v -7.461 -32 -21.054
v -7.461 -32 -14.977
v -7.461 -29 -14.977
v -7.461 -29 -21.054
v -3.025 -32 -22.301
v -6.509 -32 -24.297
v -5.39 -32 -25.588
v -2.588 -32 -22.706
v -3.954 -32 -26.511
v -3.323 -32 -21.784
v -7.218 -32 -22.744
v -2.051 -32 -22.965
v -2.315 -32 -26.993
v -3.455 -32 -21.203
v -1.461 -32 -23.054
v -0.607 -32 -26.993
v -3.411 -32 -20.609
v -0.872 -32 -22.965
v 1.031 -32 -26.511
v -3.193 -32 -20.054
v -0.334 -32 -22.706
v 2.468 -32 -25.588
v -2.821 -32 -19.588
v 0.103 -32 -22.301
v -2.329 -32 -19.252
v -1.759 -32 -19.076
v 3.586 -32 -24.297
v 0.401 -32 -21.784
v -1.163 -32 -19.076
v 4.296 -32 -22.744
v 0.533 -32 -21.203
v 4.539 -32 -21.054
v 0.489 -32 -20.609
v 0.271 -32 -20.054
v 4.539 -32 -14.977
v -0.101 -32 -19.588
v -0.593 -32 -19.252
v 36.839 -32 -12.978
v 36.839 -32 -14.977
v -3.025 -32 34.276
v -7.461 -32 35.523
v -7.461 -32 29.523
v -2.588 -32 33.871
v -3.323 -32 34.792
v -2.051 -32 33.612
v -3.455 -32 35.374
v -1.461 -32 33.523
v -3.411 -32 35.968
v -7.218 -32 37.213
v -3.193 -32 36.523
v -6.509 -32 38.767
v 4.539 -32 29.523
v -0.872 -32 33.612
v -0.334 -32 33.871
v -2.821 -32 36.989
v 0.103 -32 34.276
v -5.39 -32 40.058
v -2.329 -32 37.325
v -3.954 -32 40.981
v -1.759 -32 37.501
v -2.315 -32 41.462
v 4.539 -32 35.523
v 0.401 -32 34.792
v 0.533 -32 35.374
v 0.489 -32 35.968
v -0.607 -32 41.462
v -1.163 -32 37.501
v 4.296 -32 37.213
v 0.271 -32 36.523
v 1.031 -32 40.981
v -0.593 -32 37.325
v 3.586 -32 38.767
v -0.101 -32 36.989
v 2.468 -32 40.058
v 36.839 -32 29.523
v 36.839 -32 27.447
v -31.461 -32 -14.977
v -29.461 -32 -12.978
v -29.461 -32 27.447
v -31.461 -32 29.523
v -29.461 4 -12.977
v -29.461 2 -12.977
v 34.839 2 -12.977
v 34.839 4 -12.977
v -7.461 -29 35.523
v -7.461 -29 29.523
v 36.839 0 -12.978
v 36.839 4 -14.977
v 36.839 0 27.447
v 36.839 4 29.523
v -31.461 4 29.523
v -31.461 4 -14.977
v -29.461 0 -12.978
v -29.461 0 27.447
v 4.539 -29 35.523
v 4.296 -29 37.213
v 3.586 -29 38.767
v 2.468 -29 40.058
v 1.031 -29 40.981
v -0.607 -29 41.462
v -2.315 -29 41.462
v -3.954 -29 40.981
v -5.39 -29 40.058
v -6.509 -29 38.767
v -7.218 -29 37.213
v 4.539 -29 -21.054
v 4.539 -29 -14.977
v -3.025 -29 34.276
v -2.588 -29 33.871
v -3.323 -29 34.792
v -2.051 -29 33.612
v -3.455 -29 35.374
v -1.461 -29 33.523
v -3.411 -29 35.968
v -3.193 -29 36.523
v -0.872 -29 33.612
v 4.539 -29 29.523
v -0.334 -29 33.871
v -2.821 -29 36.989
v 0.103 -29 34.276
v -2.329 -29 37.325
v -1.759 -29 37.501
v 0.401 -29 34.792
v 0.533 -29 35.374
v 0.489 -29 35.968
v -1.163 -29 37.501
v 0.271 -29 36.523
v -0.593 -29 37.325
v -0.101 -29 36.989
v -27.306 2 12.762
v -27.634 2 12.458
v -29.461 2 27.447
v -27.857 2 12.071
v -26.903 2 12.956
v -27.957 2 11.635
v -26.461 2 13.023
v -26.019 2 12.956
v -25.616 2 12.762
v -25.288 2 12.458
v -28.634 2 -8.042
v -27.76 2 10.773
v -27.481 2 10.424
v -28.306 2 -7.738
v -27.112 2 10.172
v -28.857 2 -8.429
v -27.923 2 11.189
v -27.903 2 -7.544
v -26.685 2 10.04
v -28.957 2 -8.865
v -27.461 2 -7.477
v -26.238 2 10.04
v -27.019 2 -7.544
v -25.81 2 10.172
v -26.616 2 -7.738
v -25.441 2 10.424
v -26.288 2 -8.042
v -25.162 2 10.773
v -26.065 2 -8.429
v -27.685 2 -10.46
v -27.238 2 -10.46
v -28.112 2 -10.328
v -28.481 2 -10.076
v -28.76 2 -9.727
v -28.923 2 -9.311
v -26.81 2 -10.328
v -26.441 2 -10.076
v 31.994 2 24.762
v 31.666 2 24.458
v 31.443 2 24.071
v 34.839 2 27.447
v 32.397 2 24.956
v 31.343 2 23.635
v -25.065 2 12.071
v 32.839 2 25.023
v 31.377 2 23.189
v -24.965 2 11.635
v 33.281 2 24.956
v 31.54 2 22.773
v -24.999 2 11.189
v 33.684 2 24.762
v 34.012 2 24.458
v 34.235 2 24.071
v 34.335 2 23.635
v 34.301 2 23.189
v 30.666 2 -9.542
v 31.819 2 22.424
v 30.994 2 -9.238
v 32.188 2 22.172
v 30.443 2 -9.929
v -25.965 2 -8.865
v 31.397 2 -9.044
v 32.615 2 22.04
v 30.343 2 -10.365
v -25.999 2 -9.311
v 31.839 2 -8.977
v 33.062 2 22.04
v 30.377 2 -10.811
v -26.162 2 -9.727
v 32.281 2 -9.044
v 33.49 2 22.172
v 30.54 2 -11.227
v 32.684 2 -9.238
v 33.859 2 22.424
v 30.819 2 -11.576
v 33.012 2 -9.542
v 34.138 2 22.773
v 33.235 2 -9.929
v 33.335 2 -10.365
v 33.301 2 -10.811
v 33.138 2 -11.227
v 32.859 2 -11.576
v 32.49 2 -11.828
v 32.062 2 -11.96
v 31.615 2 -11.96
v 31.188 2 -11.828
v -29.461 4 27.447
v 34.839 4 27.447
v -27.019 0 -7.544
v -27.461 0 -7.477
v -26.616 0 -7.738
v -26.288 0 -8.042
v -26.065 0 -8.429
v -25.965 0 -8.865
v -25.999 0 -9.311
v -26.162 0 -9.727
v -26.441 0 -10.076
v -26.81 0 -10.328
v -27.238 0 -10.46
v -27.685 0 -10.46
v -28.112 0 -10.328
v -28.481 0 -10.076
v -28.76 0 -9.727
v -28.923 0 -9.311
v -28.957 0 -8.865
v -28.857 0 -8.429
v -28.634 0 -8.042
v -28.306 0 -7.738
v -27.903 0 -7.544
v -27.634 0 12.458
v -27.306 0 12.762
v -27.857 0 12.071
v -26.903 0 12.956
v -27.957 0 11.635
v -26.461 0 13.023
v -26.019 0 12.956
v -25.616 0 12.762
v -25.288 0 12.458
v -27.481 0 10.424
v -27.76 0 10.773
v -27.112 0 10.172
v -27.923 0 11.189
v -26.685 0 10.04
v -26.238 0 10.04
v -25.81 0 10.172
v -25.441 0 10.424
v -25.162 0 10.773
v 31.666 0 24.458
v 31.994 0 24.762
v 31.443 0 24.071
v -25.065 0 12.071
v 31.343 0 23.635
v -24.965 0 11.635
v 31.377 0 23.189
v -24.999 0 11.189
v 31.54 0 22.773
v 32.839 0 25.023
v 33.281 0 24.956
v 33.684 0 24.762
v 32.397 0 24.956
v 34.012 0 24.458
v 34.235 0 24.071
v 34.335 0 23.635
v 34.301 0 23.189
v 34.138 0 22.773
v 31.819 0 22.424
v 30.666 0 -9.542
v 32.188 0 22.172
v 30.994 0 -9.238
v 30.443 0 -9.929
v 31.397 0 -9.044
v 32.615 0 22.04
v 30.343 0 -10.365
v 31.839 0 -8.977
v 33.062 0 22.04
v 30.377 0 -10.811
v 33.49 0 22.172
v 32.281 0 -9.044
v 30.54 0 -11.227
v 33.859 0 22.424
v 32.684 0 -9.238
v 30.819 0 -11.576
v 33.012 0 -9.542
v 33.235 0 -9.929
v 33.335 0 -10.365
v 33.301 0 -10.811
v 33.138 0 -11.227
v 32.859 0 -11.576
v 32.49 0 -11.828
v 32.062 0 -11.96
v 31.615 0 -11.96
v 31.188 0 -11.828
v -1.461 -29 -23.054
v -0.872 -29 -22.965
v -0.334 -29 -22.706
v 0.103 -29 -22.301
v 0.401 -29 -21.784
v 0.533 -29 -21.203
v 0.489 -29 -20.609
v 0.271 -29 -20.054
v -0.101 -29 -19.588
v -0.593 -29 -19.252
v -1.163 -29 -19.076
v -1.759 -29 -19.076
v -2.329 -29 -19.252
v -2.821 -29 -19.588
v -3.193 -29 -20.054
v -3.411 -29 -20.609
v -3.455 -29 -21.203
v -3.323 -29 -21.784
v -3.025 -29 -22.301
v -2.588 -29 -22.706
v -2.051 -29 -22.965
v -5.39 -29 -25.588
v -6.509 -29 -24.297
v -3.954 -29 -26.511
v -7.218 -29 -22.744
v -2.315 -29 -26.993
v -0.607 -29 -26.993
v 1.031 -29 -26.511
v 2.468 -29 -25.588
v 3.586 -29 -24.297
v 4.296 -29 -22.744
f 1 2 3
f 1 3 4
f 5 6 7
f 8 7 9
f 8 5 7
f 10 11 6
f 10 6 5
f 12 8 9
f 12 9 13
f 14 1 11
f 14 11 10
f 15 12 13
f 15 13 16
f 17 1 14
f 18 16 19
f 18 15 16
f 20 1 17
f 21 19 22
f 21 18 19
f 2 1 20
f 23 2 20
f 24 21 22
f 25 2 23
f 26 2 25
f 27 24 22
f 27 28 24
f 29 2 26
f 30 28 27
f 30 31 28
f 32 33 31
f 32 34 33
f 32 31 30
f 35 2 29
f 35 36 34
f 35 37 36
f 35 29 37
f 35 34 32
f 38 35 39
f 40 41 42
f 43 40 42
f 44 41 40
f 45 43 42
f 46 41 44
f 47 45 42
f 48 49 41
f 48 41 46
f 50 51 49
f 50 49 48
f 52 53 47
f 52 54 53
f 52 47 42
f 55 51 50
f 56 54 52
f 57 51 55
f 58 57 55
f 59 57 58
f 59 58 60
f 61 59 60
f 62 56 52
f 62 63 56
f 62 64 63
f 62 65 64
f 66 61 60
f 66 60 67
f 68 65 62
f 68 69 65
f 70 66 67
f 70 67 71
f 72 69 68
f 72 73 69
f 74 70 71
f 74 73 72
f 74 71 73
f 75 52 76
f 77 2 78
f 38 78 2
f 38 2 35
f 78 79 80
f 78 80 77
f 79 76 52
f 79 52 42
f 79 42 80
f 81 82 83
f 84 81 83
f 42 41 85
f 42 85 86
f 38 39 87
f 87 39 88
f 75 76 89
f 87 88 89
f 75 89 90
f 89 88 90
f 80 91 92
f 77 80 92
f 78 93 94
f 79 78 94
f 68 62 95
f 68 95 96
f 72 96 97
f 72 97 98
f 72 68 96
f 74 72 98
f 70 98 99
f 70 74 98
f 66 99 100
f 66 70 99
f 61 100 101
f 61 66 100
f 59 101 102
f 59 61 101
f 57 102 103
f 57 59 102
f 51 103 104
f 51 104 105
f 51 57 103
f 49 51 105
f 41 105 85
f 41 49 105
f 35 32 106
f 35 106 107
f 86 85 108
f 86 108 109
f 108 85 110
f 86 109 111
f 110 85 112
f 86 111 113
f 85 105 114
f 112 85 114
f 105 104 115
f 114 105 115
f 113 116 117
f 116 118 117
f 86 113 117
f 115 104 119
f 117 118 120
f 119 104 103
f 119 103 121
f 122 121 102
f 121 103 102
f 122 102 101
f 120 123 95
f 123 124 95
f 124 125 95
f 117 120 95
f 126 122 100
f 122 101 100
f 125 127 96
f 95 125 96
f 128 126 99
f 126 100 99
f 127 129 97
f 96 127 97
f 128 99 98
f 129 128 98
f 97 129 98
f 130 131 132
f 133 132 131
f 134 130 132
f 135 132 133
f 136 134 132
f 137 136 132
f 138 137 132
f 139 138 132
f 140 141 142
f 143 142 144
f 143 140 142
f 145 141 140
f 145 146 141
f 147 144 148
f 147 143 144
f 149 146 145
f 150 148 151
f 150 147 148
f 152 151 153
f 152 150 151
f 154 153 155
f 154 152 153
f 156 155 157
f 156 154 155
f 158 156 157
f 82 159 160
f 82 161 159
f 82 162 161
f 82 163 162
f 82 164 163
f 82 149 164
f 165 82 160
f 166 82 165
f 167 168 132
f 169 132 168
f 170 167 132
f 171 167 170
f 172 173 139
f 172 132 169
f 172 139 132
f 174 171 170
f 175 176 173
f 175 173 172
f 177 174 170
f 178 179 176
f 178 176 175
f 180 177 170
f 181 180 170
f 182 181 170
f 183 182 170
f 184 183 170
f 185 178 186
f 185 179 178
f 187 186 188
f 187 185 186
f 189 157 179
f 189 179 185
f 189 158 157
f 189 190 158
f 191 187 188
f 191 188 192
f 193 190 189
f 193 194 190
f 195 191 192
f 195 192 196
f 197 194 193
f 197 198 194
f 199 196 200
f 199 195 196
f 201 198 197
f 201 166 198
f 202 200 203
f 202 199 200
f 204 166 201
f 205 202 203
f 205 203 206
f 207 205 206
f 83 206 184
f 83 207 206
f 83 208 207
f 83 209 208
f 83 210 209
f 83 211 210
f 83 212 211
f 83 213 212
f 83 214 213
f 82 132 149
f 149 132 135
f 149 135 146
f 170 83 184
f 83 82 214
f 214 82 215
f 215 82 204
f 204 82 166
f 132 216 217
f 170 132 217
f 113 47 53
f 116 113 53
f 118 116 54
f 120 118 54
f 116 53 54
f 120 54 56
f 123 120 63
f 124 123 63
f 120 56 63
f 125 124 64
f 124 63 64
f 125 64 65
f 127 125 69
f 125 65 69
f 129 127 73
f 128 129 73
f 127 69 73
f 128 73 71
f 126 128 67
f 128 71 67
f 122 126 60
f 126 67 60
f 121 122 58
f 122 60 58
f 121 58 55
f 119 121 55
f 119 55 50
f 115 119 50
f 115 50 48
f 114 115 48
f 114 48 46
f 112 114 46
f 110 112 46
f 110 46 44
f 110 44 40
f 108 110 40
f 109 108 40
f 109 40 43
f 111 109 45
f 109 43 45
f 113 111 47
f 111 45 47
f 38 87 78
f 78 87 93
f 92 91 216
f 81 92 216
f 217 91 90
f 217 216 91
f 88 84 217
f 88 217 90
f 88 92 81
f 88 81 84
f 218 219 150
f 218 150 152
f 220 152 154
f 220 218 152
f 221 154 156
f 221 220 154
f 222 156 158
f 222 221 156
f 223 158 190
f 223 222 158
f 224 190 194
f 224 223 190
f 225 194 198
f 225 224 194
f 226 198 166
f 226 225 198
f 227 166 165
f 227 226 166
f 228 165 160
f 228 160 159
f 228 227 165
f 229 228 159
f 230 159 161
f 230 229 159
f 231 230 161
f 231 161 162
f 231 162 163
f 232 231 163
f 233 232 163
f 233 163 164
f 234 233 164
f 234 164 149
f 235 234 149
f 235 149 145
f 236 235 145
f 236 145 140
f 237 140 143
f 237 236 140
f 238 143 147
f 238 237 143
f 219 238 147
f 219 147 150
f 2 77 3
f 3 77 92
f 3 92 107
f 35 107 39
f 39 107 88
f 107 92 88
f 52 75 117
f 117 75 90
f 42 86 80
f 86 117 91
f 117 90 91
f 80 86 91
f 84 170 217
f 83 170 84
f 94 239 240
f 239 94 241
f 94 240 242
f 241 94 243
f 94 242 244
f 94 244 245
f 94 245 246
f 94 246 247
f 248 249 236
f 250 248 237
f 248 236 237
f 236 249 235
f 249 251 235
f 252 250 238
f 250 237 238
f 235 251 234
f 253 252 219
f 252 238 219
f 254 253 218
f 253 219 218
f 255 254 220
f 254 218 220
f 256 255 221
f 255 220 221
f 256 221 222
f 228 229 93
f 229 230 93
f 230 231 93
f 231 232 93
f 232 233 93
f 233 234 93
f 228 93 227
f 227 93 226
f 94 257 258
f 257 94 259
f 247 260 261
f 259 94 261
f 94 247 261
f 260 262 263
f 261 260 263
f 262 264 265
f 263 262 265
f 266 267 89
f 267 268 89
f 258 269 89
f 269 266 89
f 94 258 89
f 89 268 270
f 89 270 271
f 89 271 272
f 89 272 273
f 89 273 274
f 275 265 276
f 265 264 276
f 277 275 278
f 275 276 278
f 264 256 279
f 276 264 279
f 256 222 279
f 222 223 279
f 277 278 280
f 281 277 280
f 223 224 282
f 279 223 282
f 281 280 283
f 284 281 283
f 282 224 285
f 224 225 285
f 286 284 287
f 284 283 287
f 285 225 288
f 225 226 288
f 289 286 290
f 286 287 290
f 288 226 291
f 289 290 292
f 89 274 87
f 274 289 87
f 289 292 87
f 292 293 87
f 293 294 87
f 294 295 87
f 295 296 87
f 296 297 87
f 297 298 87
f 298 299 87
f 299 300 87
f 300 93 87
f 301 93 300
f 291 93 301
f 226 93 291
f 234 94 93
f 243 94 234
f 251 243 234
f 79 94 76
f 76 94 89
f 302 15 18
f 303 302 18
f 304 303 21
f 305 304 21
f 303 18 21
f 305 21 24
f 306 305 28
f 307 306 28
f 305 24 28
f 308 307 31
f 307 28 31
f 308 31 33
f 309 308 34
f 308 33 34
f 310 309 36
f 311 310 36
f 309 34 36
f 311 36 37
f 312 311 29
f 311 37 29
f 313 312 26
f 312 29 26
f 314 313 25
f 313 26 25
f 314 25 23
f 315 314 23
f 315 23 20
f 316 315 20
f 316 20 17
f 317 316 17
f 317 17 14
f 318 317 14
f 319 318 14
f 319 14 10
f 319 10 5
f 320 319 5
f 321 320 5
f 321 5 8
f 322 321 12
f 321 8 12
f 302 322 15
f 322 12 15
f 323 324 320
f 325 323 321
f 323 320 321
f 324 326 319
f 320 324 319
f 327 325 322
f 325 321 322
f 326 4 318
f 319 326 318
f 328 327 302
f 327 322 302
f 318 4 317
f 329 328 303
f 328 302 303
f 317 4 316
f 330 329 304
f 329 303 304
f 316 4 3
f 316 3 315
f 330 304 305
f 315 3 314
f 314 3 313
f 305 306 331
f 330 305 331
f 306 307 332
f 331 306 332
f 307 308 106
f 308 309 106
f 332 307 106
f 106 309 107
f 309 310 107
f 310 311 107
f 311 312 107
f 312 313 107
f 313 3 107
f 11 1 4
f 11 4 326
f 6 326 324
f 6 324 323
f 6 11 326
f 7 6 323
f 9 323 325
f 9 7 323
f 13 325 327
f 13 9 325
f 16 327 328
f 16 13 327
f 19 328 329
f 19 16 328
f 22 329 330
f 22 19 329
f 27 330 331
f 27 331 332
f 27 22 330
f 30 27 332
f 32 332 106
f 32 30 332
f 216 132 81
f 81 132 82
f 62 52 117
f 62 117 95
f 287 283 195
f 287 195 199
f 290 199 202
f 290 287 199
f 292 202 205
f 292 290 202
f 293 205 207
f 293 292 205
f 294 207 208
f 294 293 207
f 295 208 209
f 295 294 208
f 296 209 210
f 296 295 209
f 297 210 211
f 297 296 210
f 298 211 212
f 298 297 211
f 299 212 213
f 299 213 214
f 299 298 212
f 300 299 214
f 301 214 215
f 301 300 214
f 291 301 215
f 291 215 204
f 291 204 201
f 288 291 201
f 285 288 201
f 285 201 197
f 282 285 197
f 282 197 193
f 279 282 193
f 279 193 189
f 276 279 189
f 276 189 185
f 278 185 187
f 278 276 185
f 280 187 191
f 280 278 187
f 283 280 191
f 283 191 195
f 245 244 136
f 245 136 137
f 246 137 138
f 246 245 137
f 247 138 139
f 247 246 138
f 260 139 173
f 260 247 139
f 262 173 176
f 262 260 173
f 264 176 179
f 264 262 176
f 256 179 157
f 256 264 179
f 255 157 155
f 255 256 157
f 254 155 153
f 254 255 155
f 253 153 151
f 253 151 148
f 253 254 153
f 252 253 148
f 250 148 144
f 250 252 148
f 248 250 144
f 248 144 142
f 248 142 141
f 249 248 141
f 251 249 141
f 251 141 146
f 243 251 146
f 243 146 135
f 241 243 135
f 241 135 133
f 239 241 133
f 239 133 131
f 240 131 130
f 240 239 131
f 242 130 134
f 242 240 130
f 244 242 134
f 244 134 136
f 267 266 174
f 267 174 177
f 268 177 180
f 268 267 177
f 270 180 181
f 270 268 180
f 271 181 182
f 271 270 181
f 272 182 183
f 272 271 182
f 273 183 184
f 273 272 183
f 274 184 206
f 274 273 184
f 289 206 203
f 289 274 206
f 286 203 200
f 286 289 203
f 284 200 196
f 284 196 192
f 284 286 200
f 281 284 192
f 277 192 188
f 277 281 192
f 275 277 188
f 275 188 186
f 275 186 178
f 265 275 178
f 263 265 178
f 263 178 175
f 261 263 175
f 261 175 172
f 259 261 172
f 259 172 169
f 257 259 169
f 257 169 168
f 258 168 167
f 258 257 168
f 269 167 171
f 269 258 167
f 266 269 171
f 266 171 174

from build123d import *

# Parameters (mm, degrees)
SKETCH1_W                = 64.3
SKETCH1_H                = 40.5
SKETCH1_R                = 1.5
BOSS_EXTRUDE1_DEPTH      = 2
SKETCH1_3_W              = 68.3
SKETCH1_3_H              = 44.5
SKETCH1_3_W_2            = 64.3
SKETCH1_3_H_2            = 40.5
BOSS_EXTRUDE2_DEPTH      = 4
BOSS_EXTRUDE3_DEPTH      = 32
BOSS_EXTRUDE3_DEPTH_BACK = 4
SKETCH5_R                = 2
BOSS_EXTRUDE4_DEPTH      = 3


with BuildPart() as part:
    # Sketch1 → Boss-Extrude1 (new body)
    with BuildSketch(Plane(origin=(0, 0, 0), x_dir=(1, 0, 0), z_dir=(0, 1, 0))):
        with Locations((2.688909091, -7.273090909)):
            Rectangle(SKETCH1_W, SKETCH1_H)
        with Locations((-26.461090909, -11.523090909)):
            Circle(SKETCH1_R, mode=Mode.SUBTRACT)
        with Locations((32.838909091, -23.523090909)):
            Circle(SKETCH1_R, mode=Mode.SUBTRACT)
        with Locations((-27.461090909, 8.976909091)):
            Circle(SKETCH1_R, mode=Mode.SUBTRACT)
        with Locations((31.838909091, 10.476909091)):
            Circle(SKETCH1_R, mode=Mode.SUBTRACT)
    extrude(amount=BOSS_EXTRUDE1_DEPTH)

    # Sketch1<3> → Boss-Extrude2 (add)
    with BuildSketch(Plane(origin=(0, 0, 0), x_dir=(1, 0, 0), z_dir=(0, 1, 0))):
        with Locations((2.688909091, -7.273090909)):
            Rectangle(SKETCH1_3_W, SKETCH1_3_H)
        with Locations((2.688909091, -7.273090909)):
            Rectangle(SKETCH1_3_W_2, SKETCH1_3_H_2, mode=Mode.SUBTRACT)
    extrude(amount=BOSS_EXTRUDE2_DEPTH)

    # Sketch3 → Boss-Extrude3 (add, two sides: drawn at the far end of the back side and taken through both)
    with BuildSketch(Plane.XZ.offset(-BOSS_EXTRUDE3_DEPTH_BACK)):
        Polygon((-31.461090909, -14.976909091), (36.838909091, -14.976909091), (36.838909091, -12.977521958), (-29.461090909, -12.977521958), (-29.461090909, 27.446996909), (36.838909091, 27.446996909), (36.838909091, 29.523090909), (-31.461090909, 29.523090909), align=None)
    extrude(amount=BOSS_EXTRUDE3_DEPTH + BOSS_EXTRUDE3_DEPTH_BACK)

    # Sketch5 → Boss-Extrude4 (add)
    # profile 1 of 2: a face of its own
    with BuildSketch(Plane.XZ.offset(32)):
        with BuildLine():
            Line((-7.461090909, -12.977521958), (-7.461090909, -21.053615958))
            ThreePointArc((-7.461090909, -21.053615958), (-1.461090909, -27.053615958), (4.538909091, -21.053615958))
            Line((4.538909091, -21.053615958), (4.538909091, -12.977521958))
            Line((4.538909091, -12.977521958), (-7.461090909, -12.977521958))
        make_face()
        with Locations((-1.461090909, -21.053615958)):
            Circle(SKETCH5_R, mode=Mode.SUBTRACT)
    # profile 2 of 2: a face of its own
    with BuildSketch(Plane.XZ.offset(32)):
        with BuildLine():
            ThreePointArc((4.538909091, 35.523090909), (-1.461090909, 41.523090909), (-7.461090909, 35.523090909))
            Line((-7.461090909, 35.523090909), (-7.461090909, 29.523090909))
            Line((-7.461090909, 29.523090909), (4.538909091, 29.523090909))
            Line((4.538909091, 29.523090909), (4.538909091, 35.523090909))
        make_face()
        with Locations((-1.461090909, 35.523090909)):
            Circle(SKETCH5_R, mode=Mode.SUBTRACT)
    extrude(amount=-BOSS_EXTRUDE4_DEPTH)


solid = part.part
